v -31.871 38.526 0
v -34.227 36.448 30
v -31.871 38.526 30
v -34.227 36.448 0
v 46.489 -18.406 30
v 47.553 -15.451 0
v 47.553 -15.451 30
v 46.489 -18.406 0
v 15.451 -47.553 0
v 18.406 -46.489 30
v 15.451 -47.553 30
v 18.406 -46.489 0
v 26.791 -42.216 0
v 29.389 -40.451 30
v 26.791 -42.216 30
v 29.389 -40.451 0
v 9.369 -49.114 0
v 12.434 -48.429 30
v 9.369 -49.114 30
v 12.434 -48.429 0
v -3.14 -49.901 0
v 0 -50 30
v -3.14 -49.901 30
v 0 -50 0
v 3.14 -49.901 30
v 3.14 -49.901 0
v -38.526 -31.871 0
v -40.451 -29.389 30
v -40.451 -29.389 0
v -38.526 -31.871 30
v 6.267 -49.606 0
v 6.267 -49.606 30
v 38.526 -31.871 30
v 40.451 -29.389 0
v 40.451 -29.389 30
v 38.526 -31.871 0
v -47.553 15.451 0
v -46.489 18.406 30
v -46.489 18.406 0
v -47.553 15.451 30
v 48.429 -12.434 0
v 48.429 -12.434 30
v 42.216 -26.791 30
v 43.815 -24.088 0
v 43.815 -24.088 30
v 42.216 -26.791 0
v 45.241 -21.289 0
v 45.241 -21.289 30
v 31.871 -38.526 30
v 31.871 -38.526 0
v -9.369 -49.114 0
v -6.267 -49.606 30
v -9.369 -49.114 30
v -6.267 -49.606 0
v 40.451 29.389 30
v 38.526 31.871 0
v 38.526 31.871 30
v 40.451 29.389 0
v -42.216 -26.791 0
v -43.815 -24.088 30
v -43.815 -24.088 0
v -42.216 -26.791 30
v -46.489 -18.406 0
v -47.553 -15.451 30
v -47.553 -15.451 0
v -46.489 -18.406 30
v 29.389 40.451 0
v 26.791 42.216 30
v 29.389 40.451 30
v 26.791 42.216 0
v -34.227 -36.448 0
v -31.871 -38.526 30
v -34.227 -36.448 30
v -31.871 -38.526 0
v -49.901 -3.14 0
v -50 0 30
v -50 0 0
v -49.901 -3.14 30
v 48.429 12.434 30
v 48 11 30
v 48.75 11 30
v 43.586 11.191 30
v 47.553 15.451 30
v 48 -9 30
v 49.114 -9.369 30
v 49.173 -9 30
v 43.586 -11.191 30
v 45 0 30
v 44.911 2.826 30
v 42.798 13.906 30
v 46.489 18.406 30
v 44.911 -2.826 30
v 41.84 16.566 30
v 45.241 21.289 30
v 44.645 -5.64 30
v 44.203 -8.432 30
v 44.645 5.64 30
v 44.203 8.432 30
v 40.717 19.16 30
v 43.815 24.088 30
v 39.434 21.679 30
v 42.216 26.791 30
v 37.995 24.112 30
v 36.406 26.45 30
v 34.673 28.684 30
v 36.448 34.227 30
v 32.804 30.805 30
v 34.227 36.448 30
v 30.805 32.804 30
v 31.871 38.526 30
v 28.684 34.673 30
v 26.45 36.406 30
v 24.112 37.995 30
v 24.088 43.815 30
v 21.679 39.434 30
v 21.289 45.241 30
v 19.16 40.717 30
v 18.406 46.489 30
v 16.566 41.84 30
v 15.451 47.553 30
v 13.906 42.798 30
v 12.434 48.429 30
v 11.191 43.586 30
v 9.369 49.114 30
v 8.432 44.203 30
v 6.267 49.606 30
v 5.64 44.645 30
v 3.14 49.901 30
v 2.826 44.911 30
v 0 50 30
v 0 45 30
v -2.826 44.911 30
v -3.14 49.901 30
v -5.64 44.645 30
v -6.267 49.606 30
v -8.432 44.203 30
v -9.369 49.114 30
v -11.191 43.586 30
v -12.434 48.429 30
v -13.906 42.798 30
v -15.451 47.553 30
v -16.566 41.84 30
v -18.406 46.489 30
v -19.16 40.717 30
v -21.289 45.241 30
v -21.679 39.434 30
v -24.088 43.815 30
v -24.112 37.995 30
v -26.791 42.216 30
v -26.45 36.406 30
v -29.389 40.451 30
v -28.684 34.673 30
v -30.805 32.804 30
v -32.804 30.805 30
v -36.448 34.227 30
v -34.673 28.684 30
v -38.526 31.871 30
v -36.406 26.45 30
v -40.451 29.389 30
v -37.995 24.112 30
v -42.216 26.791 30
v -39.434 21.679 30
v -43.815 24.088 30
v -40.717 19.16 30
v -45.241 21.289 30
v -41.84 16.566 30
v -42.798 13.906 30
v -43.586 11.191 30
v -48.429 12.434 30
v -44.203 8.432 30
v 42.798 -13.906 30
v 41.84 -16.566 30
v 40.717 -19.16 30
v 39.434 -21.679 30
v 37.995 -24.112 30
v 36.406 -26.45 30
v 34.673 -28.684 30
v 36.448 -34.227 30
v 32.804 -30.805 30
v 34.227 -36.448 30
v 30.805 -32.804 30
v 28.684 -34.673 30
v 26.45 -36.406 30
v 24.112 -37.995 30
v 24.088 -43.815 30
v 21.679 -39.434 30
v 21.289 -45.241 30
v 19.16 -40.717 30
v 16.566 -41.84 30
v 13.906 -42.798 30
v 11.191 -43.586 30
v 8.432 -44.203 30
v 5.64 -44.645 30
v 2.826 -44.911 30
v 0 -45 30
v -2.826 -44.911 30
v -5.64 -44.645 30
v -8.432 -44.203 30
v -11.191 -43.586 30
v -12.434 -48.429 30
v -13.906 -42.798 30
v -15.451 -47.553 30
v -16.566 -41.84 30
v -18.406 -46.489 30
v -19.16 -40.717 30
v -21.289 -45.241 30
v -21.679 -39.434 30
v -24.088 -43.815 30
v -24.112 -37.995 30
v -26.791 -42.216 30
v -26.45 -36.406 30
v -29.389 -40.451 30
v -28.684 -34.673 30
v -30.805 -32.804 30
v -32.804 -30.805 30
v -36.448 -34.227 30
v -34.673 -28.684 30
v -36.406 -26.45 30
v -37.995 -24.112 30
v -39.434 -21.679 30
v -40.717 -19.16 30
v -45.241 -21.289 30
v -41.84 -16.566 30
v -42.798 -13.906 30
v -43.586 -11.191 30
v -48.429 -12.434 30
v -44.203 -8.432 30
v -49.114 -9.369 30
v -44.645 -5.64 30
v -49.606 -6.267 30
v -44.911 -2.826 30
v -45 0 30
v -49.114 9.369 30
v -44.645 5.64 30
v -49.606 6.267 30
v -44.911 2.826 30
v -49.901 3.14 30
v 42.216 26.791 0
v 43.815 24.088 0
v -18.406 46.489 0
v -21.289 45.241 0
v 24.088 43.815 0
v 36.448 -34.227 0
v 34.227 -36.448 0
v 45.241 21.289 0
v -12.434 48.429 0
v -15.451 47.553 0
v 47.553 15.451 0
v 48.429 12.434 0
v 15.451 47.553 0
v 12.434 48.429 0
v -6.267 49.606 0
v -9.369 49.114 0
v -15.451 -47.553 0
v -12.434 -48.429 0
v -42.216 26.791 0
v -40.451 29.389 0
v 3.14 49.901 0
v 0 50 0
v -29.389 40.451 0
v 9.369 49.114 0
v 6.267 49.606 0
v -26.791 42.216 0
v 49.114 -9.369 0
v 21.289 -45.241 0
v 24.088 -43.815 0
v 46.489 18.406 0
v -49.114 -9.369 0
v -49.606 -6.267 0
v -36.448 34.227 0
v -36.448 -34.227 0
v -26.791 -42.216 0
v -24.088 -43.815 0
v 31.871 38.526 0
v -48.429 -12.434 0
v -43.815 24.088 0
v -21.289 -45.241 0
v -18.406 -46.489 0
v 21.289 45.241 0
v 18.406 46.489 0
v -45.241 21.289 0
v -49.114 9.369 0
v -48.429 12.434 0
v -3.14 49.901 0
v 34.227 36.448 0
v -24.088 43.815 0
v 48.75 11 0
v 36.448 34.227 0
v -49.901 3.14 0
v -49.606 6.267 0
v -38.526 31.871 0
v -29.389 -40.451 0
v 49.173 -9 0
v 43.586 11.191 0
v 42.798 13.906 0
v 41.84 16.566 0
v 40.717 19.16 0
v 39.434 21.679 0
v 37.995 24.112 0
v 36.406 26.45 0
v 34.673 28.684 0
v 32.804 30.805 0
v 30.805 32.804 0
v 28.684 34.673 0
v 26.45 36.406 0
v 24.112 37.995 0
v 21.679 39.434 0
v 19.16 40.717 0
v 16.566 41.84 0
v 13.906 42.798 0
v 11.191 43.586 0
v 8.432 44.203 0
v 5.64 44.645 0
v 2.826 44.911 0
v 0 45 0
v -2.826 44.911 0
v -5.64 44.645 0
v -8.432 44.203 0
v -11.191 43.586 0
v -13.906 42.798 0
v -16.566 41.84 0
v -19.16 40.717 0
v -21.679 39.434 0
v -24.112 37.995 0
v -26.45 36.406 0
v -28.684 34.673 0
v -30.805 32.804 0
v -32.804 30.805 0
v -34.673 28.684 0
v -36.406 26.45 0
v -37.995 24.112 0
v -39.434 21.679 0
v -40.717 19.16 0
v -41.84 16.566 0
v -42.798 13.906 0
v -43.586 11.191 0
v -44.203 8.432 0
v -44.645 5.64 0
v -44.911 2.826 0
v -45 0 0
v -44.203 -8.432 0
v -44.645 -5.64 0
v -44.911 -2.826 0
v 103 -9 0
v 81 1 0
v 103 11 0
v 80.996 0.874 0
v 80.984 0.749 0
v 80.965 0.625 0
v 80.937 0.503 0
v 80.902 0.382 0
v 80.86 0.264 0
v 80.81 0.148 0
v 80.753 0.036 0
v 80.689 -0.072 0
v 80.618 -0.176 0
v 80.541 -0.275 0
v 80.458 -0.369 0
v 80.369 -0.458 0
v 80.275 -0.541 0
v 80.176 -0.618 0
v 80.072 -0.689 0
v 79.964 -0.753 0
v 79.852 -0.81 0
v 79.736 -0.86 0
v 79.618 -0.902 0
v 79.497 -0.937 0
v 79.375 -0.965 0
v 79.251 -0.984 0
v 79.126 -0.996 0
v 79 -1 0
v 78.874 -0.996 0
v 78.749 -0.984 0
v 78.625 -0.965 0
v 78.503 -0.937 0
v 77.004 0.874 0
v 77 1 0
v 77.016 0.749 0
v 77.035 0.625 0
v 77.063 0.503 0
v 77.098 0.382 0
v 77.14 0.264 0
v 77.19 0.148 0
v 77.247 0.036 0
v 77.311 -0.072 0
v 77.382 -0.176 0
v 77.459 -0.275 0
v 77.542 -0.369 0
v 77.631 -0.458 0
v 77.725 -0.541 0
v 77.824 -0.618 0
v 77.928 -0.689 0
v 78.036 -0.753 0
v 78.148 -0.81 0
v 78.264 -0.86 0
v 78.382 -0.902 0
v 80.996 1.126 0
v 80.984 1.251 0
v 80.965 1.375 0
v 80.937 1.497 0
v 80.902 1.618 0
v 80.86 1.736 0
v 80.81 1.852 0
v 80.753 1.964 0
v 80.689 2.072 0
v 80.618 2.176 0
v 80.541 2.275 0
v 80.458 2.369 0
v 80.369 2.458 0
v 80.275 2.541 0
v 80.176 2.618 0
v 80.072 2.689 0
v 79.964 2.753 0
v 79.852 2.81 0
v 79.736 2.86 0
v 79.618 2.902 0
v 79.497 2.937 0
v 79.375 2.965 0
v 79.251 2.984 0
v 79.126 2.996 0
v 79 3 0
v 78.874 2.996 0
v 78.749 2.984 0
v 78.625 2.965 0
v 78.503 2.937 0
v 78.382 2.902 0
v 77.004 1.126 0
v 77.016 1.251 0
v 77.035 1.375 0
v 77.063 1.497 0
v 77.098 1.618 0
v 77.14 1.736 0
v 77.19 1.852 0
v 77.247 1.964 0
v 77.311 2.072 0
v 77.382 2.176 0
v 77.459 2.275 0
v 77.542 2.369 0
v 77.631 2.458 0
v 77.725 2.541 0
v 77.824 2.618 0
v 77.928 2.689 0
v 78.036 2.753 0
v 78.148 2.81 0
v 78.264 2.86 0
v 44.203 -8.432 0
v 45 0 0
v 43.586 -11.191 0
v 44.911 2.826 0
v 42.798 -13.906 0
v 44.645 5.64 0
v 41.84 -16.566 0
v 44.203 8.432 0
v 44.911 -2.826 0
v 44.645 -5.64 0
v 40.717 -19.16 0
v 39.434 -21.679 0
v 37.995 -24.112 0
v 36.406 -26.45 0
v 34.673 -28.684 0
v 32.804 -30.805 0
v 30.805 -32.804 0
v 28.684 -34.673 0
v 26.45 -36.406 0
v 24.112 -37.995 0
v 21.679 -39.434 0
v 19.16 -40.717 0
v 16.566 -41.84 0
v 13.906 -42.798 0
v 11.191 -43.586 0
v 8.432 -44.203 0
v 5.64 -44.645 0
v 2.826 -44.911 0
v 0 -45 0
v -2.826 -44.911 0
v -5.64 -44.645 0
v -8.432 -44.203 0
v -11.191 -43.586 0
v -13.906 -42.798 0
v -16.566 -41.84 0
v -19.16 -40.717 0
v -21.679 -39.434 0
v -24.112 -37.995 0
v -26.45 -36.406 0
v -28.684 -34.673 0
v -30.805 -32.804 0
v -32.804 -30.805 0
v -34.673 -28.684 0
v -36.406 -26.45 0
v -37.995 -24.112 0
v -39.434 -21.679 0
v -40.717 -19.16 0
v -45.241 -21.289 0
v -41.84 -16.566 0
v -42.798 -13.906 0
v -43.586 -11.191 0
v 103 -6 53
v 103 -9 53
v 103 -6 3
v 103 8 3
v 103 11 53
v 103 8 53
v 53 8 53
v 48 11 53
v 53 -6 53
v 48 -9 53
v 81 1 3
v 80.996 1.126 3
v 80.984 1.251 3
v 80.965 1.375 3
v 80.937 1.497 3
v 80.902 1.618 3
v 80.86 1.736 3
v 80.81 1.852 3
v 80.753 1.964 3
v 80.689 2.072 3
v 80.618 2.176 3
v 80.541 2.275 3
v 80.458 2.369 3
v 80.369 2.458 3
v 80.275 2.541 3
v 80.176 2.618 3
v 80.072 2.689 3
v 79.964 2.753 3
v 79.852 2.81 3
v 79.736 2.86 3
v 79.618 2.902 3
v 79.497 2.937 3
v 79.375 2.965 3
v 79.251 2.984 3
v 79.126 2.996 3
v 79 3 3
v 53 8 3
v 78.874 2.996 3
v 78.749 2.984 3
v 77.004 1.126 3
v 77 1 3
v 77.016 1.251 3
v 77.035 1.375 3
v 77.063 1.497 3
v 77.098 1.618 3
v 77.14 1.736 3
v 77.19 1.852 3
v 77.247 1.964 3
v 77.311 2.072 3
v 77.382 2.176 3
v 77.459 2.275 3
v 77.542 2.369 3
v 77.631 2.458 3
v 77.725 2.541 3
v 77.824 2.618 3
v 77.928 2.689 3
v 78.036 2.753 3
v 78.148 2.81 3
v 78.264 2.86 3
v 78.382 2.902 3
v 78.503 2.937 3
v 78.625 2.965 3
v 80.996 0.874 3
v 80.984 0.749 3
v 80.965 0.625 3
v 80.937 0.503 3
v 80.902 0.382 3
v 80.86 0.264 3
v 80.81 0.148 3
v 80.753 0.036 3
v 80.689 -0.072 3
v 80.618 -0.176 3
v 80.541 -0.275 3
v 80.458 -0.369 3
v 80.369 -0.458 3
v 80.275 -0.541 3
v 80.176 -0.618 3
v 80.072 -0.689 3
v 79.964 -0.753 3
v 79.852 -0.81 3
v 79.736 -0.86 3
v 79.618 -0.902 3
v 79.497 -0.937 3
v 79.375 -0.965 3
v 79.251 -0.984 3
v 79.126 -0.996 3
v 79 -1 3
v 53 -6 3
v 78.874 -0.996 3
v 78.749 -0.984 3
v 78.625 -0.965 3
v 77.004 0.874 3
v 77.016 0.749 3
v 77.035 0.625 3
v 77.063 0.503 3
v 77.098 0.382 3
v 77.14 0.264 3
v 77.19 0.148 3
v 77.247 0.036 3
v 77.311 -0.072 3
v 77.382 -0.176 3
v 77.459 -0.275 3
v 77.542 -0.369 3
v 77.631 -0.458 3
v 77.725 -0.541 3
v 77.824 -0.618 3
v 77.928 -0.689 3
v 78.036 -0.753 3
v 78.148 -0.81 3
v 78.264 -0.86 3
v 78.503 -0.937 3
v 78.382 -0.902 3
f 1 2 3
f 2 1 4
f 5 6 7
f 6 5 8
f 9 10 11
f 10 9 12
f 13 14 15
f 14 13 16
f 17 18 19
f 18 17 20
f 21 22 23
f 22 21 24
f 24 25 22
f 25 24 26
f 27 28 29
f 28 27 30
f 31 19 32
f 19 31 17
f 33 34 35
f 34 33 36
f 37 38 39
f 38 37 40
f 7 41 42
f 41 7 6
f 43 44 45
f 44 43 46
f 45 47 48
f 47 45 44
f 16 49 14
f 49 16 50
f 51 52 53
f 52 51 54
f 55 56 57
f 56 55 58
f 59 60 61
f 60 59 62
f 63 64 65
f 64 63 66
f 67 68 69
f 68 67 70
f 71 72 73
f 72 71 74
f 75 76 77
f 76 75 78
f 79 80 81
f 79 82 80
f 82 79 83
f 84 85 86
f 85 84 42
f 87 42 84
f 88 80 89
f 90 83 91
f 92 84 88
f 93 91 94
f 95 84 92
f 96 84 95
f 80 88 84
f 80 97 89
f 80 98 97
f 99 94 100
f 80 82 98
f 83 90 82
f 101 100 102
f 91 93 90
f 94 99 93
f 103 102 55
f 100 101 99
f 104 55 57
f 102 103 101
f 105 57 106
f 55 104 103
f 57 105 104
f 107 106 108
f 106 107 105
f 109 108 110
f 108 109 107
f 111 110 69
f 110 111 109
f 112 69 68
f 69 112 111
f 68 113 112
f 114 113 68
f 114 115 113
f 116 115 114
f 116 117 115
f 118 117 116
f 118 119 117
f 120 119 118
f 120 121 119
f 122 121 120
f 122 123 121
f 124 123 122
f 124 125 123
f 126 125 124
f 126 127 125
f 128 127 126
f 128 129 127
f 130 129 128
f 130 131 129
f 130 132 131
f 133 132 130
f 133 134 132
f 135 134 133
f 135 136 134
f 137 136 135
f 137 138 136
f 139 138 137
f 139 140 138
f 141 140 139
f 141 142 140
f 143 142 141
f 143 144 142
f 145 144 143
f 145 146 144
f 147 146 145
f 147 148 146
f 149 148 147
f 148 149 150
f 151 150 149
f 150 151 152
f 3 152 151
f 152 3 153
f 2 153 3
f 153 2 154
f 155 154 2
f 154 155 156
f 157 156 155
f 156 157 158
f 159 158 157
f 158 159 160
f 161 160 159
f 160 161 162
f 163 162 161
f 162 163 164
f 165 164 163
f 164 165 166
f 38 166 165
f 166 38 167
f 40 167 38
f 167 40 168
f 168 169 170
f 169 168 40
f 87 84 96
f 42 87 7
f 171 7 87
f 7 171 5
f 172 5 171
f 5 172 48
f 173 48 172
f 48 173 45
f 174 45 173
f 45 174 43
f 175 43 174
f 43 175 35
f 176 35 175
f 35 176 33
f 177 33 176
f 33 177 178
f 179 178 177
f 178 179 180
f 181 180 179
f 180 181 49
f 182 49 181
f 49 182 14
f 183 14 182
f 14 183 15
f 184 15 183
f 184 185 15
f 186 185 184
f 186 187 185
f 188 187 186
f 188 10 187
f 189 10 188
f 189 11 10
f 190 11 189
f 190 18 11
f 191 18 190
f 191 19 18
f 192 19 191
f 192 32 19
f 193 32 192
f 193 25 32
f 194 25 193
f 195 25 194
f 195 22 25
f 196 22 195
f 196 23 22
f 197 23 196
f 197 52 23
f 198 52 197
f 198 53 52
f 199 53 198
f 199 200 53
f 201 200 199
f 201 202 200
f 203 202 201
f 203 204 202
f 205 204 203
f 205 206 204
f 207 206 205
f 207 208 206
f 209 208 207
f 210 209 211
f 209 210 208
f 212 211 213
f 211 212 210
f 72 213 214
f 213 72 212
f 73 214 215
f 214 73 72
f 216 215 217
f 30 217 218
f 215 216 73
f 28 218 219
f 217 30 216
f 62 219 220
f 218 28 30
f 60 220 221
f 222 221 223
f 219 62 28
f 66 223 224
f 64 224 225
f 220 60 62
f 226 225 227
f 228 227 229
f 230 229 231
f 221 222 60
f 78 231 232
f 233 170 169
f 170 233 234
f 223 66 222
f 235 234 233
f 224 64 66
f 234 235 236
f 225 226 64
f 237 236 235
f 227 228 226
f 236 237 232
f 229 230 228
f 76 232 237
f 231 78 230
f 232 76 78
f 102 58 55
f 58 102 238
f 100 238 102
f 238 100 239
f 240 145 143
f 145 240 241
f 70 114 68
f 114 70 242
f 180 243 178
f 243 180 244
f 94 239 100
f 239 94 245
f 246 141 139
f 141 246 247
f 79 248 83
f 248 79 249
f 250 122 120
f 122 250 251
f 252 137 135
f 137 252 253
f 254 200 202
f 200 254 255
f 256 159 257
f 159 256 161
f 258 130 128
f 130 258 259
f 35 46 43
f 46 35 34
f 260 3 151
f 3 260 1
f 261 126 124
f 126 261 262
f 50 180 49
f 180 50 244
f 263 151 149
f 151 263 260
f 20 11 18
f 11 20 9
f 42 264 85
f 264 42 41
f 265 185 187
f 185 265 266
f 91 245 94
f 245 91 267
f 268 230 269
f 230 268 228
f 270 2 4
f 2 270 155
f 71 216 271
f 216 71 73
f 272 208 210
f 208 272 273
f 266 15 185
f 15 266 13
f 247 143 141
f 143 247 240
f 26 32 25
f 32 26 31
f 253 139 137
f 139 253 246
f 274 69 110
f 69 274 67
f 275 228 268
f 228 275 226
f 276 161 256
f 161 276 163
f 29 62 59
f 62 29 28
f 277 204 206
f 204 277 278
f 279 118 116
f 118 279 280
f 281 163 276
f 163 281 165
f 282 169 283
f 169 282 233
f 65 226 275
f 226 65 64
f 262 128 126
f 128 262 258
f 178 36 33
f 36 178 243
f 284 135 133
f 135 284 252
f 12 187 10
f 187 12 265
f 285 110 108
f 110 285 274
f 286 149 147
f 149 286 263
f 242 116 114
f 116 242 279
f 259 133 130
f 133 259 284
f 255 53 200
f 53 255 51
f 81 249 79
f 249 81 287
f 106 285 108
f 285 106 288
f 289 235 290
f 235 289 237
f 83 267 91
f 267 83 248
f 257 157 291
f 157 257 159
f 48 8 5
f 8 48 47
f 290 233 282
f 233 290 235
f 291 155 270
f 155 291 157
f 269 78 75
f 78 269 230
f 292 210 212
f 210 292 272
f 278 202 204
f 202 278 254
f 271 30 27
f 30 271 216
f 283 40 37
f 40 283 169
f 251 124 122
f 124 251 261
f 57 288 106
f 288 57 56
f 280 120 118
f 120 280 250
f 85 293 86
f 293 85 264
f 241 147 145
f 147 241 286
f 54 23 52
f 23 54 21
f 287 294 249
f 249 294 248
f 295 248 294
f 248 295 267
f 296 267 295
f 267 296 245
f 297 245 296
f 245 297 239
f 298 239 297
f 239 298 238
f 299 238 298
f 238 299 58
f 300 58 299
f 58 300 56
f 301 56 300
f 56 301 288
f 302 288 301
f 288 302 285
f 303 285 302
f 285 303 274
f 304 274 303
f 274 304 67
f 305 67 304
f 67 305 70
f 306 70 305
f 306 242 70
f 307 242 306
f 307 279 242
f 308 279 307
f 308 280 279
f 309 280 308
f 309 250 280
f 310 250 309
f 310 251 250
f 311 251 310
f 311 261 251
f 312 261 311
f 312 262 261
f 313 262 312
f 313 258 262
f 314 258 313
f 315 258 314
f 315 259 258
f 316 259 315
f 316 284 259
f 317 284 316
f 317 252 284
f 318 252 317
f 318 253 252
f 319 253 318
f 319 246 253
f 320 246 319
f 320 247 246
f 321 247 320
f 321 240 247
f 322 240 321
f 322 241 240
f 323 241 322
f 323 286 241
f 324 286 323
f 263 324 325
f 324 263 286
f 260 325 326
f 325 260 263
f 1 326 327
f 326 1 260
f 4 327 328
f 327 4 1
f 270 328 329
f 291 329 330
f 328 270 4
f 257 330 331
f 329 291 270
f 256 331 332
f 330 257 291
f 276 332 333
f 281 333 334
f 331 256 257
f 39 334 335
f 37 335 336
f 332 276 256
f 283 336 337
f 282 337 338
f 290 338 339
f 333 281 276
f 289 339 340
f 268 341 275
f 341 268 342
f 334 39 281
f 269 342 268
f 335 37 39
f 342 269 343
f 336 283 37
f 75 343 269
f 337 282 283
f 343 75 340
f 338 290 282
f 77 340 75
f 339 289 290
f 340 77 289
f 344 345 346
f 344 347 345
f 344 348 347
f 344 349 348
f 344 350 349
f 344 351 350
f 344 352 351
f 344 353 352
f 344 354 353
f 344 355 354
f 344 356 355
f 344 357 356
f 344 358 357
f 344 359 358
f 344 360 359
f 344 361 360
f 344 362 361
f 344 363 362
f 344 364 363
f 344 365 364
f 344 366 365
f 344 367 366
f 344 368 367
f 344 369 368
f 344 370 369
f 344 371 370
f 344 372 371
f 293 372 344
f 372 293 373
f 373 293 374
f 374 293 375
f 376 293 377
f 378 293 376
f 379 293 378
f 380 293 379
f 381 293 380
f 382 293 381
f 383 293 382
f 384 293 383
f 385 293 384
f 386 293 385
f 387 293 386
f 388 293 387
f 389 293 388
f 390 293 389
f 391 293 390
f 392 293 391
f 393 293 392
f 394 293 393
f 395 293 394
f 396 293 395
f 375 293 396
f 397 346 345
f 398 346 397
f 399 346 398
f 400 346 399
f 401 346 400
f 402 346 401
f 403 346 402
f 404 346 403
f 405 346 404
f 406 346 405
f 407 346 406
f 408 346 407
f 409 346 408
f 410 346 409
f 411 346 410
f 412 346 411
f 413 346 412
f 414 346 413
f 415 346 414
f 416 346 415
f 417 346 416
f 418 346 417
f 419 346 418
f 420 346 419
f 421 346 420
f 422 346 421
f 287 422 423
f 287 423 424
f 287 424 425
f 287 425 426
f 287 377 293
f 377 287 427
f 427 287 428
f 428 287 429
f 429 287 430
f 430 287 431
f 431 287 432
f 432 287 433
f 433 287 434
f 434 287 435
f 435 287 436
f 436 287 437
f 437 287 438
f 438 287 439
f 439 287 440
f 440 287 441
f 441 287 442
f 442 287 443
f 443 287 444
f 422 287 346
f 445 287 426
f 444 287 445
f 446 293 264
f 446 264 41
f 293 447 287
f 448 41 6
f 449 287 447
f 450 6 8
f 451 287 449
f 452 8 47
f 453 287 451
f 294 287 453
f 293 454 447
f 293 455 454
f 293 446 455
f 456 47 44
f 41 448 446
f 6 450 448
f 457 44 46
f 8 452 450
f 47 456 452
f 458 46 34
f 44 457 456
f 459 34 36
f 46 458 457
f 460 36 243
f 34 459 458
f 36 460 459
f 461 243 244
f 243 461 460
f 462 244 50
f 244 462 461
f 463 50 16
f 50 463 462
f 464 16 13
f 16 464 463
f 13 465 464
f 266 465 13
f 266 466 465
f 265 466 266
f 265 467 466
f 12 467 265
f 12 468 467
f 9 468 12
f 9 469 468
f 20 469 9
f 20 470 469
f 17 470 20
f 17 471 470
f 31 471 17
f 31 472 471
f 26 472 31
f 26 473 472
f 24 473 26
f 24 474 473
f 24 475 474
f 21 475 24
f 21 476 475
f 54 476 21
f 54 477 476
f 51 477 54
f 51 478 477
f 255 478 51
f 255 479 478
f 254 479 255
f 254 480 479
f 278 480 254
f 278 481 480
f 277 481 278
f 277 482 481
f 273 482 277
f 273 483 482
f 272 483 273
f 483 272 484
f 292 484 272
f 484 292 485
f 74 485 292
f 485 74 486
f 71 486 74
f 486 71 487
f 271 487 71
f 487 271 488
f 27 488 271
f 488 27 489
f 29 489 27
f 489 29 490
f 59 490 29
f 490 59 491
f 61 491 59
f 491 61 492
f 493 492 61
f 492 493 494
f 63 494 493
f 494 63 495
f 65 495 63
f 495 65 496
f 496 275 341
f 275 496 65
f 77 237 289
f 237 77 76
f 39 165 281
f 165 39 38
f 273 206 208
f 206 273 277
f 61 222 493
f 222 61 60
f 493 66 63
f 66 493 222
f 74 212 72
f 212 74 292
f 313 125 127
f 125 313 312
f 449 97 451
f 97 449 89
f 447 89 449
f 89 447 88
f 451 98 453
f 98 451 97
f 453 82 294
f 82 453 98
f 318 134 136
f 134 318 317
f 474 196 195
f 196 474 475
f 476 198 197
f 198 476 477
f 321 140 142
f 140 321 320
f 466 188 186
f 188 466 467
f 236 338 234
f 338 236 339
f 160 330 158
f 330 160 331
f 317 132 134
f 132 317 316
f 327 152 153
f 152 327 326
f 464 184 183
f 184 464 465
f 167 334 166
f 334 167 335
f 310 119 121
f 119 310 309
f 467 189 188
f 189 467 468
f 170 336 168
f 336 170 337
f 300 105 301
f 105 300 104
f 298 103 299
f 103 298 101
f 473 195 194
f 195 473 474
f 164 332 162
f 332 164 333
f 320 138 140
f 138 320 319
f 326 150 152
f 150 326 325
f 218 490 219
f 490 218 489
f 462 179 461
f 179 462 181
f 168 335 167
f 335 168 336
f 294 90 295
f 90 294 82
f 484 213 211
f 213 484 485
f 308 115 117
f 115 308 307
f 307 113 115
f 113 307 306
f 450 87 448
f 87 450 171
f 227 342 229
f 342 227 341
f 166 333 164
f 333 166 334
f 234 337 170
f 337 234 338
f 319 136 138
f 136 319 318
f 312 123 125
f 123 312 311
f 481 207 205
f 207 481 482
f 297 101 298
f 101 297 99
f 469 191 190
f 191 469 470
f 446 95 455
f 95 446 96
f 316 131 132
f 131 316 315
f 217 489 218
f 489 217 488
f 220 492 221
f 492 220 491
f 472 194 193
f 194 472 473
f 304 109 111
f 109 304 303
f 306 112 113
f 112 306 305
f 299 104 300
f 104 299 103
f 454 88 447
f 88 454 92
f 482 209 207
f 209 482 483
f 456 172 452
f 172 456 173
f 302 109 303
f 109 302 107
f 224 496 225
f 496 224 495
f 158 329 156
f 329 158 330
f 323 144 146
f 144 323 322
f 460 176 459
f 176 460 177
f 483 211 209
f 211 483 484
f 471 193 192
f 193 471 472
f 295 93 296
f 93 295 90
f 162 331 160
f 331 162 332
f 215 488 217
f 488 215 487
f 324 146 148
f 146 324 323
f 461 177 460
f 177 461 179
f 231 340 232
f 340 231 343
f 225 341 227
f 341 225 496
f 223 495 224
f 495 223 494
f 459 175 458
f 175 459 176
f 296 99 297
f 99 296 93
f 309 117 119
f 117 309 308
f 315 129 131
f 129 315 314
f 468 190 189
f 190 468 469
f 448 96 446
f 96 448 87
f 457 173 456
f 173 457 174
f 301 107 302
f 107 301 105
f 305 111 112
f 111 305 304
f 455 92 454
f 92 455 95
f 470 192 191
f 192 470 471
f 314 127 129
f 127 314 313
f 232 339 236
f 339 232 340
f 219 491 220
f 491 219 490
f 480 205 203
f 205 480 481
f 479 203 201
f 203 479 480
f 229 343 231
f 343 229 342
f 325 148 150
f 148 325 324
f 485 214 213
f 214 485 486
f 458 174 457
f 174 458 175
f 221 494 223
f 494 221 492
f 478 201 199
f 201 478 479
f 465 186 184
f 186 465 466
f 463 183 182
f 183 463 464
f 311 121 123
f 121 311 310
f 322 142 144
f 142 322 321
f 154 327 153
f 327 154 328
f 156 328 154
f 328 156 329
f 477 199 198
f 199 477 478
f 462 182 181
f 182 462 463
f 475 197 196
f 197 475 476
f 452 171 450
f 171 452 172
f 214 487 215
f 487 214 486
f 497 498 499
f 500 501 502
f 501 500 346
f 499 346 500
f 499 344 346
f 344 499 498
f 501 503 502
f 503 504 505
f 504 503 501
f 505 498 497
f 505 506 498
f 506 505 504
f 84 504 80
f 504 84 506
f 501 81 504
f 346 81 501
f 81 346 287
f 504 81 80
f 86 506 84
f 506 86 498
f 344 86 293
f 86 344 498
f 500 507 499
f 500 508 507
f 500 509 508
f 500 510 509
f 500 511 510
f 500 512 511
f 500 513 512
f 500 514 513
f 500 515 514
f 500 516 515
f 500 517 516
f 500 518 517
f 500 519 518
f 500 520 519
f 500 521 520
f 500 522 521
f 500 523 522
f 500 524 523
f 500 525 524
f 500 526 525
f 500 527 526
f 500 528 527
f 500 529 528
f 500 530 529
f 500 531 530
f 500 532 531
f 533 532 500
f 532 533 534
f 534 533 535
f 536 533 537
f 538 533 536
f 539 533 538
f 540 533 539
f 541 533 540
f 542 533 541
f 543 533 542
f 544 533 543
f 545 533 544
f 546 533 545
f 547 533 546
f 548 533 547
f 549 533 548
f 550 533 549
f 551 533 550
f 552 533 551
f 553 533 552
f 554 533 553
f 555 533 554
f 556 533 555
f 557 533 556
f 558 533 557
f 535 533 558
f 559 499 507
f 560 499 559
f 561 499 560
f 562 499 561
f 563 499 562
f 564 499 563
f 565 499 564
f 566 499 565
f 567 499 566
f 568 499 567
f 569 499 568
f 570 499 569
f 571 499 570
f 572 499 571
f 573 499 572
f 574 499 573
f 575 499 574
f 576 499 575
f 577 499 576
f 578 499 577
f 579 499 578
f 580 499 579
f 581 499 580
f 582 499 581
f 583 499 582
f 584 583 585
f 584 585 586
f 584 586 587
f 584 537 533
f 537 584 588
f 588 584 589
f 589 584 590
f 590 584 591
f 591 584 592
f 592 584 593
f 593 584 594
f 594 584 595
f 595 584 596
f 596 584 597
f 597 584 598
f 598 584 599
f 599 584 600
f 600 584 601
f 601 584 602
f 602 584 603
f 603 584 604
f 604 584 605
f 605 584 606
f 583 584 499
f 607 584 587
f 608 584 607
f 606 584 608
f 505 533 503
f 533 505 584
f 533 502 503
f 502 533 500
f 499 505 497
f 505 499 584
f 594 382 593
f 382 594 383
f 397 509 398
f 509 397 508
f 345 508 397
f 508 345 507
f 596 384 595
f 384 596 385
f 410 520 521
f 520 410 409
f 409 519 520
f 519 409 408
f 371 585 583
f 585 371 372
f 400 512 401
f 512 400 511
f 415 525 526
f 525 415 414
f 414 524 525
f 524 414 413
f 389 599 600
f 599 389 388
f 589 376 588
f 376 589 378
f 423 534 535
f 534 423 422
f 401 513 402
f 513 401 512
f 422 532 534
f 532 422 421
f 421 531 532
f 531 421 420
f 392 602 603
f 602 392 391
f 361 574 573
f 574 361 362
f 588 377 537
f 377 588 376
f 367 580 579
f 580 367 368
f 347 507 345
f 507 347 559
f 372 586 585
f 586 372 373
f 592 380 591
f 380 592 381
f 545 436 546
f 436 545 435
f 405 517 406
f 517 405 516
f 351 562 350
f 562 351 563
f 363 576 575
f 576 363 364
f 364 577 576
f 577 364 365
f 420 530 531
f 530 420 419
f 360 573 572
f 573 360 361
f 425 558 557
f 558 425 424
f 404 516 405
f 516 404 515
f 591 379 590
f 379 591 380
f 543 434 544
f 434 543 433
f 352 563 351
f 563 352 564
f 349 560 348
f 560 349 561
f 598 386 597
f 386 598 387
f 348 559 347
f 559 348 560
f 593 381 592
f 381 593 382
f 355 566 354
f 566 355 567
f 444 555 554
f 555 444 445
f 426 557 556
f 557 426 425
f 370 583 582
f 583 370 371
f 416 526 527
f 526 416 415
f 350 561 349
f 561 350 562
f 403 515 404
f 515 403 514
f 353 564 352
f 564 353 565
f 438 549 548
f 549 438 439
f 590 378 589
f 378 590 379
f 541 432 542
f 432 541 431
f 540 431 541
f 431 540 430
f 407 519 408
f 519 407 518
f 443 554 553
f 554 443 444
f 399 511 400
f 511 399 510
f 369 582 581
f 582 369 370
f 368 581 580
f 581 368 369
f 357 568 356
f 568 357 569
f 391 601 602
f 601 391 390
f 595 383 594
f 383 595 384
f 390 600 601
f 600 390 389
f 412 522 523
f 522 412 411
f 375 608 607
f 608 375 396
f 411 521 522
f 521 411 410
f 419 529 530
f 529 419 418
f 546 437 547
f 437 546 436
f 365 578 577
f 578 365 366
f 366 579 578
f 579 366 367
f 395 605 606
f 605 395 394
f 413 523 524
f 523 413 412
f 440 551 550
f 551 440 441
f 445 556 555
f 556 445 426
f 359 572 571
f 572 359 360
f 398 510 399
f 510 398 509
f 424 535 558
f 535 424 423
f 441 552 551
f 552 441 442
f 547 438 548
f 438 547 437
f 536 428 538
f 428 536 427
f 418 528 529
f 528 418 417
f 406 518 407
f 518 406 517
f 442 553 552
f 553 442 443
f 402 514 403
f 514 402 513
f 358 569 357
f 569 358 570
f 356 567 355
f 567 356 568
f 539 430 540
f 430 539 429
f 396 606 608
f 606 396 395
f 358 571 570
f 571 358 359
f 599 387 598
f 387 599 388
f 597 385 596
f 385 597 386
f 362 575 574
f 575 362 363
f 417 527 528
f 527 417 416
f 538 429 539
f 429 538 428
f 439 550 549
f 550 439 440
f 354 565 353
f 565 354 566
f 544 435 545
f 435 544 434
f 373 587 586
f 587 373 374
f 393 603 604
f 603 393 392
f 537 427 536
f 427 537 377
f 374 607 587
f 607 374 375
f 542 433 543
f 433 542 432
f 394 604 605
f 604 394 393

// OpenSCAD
//
//
//  Sign post holder
//
//   R. Lazure   Nov. 6 2018
//
inner_dia = 90;
depth = 30;
board_width = 14;
board_height = 50;
hold_length= 50;
//
/* Hidden */
$fn=100;
outer_dia = inner_dia + 10;
//
difference() {
union() {

//
// outer diameter
//
translate([0,0,0])
 cylinder(h=depth, r1=outer_dia/2, r2=outer_dia/2, center=false);
 }
//
//  remove inner material
//
color("red")
 cylinder(h=2*depth+20, r1=inner_dia/2, r2=inner_dia/2, center=true);
 }
difference() {
//
// add sign holding block shell
translate([outer_dia/2-2,-9,0])
cube([hold_length+5,board_width+6,board_height+3],false);
//
//  remove sign
//
translate([outer_dia/2+3,-6,3])
cube([hold_length+10,board_width,board_height+15],false);
//
//  add retaining screw hole
//
 xt=(outer_dia+hold_length)/2;
 translate([xt+4,1,0])
cylinder(h=10, r1=2, r2=2, center=true);
 }
//
//   cross-section check
//
// translate([-100,0,0])
// cube([200,200,300],true);
